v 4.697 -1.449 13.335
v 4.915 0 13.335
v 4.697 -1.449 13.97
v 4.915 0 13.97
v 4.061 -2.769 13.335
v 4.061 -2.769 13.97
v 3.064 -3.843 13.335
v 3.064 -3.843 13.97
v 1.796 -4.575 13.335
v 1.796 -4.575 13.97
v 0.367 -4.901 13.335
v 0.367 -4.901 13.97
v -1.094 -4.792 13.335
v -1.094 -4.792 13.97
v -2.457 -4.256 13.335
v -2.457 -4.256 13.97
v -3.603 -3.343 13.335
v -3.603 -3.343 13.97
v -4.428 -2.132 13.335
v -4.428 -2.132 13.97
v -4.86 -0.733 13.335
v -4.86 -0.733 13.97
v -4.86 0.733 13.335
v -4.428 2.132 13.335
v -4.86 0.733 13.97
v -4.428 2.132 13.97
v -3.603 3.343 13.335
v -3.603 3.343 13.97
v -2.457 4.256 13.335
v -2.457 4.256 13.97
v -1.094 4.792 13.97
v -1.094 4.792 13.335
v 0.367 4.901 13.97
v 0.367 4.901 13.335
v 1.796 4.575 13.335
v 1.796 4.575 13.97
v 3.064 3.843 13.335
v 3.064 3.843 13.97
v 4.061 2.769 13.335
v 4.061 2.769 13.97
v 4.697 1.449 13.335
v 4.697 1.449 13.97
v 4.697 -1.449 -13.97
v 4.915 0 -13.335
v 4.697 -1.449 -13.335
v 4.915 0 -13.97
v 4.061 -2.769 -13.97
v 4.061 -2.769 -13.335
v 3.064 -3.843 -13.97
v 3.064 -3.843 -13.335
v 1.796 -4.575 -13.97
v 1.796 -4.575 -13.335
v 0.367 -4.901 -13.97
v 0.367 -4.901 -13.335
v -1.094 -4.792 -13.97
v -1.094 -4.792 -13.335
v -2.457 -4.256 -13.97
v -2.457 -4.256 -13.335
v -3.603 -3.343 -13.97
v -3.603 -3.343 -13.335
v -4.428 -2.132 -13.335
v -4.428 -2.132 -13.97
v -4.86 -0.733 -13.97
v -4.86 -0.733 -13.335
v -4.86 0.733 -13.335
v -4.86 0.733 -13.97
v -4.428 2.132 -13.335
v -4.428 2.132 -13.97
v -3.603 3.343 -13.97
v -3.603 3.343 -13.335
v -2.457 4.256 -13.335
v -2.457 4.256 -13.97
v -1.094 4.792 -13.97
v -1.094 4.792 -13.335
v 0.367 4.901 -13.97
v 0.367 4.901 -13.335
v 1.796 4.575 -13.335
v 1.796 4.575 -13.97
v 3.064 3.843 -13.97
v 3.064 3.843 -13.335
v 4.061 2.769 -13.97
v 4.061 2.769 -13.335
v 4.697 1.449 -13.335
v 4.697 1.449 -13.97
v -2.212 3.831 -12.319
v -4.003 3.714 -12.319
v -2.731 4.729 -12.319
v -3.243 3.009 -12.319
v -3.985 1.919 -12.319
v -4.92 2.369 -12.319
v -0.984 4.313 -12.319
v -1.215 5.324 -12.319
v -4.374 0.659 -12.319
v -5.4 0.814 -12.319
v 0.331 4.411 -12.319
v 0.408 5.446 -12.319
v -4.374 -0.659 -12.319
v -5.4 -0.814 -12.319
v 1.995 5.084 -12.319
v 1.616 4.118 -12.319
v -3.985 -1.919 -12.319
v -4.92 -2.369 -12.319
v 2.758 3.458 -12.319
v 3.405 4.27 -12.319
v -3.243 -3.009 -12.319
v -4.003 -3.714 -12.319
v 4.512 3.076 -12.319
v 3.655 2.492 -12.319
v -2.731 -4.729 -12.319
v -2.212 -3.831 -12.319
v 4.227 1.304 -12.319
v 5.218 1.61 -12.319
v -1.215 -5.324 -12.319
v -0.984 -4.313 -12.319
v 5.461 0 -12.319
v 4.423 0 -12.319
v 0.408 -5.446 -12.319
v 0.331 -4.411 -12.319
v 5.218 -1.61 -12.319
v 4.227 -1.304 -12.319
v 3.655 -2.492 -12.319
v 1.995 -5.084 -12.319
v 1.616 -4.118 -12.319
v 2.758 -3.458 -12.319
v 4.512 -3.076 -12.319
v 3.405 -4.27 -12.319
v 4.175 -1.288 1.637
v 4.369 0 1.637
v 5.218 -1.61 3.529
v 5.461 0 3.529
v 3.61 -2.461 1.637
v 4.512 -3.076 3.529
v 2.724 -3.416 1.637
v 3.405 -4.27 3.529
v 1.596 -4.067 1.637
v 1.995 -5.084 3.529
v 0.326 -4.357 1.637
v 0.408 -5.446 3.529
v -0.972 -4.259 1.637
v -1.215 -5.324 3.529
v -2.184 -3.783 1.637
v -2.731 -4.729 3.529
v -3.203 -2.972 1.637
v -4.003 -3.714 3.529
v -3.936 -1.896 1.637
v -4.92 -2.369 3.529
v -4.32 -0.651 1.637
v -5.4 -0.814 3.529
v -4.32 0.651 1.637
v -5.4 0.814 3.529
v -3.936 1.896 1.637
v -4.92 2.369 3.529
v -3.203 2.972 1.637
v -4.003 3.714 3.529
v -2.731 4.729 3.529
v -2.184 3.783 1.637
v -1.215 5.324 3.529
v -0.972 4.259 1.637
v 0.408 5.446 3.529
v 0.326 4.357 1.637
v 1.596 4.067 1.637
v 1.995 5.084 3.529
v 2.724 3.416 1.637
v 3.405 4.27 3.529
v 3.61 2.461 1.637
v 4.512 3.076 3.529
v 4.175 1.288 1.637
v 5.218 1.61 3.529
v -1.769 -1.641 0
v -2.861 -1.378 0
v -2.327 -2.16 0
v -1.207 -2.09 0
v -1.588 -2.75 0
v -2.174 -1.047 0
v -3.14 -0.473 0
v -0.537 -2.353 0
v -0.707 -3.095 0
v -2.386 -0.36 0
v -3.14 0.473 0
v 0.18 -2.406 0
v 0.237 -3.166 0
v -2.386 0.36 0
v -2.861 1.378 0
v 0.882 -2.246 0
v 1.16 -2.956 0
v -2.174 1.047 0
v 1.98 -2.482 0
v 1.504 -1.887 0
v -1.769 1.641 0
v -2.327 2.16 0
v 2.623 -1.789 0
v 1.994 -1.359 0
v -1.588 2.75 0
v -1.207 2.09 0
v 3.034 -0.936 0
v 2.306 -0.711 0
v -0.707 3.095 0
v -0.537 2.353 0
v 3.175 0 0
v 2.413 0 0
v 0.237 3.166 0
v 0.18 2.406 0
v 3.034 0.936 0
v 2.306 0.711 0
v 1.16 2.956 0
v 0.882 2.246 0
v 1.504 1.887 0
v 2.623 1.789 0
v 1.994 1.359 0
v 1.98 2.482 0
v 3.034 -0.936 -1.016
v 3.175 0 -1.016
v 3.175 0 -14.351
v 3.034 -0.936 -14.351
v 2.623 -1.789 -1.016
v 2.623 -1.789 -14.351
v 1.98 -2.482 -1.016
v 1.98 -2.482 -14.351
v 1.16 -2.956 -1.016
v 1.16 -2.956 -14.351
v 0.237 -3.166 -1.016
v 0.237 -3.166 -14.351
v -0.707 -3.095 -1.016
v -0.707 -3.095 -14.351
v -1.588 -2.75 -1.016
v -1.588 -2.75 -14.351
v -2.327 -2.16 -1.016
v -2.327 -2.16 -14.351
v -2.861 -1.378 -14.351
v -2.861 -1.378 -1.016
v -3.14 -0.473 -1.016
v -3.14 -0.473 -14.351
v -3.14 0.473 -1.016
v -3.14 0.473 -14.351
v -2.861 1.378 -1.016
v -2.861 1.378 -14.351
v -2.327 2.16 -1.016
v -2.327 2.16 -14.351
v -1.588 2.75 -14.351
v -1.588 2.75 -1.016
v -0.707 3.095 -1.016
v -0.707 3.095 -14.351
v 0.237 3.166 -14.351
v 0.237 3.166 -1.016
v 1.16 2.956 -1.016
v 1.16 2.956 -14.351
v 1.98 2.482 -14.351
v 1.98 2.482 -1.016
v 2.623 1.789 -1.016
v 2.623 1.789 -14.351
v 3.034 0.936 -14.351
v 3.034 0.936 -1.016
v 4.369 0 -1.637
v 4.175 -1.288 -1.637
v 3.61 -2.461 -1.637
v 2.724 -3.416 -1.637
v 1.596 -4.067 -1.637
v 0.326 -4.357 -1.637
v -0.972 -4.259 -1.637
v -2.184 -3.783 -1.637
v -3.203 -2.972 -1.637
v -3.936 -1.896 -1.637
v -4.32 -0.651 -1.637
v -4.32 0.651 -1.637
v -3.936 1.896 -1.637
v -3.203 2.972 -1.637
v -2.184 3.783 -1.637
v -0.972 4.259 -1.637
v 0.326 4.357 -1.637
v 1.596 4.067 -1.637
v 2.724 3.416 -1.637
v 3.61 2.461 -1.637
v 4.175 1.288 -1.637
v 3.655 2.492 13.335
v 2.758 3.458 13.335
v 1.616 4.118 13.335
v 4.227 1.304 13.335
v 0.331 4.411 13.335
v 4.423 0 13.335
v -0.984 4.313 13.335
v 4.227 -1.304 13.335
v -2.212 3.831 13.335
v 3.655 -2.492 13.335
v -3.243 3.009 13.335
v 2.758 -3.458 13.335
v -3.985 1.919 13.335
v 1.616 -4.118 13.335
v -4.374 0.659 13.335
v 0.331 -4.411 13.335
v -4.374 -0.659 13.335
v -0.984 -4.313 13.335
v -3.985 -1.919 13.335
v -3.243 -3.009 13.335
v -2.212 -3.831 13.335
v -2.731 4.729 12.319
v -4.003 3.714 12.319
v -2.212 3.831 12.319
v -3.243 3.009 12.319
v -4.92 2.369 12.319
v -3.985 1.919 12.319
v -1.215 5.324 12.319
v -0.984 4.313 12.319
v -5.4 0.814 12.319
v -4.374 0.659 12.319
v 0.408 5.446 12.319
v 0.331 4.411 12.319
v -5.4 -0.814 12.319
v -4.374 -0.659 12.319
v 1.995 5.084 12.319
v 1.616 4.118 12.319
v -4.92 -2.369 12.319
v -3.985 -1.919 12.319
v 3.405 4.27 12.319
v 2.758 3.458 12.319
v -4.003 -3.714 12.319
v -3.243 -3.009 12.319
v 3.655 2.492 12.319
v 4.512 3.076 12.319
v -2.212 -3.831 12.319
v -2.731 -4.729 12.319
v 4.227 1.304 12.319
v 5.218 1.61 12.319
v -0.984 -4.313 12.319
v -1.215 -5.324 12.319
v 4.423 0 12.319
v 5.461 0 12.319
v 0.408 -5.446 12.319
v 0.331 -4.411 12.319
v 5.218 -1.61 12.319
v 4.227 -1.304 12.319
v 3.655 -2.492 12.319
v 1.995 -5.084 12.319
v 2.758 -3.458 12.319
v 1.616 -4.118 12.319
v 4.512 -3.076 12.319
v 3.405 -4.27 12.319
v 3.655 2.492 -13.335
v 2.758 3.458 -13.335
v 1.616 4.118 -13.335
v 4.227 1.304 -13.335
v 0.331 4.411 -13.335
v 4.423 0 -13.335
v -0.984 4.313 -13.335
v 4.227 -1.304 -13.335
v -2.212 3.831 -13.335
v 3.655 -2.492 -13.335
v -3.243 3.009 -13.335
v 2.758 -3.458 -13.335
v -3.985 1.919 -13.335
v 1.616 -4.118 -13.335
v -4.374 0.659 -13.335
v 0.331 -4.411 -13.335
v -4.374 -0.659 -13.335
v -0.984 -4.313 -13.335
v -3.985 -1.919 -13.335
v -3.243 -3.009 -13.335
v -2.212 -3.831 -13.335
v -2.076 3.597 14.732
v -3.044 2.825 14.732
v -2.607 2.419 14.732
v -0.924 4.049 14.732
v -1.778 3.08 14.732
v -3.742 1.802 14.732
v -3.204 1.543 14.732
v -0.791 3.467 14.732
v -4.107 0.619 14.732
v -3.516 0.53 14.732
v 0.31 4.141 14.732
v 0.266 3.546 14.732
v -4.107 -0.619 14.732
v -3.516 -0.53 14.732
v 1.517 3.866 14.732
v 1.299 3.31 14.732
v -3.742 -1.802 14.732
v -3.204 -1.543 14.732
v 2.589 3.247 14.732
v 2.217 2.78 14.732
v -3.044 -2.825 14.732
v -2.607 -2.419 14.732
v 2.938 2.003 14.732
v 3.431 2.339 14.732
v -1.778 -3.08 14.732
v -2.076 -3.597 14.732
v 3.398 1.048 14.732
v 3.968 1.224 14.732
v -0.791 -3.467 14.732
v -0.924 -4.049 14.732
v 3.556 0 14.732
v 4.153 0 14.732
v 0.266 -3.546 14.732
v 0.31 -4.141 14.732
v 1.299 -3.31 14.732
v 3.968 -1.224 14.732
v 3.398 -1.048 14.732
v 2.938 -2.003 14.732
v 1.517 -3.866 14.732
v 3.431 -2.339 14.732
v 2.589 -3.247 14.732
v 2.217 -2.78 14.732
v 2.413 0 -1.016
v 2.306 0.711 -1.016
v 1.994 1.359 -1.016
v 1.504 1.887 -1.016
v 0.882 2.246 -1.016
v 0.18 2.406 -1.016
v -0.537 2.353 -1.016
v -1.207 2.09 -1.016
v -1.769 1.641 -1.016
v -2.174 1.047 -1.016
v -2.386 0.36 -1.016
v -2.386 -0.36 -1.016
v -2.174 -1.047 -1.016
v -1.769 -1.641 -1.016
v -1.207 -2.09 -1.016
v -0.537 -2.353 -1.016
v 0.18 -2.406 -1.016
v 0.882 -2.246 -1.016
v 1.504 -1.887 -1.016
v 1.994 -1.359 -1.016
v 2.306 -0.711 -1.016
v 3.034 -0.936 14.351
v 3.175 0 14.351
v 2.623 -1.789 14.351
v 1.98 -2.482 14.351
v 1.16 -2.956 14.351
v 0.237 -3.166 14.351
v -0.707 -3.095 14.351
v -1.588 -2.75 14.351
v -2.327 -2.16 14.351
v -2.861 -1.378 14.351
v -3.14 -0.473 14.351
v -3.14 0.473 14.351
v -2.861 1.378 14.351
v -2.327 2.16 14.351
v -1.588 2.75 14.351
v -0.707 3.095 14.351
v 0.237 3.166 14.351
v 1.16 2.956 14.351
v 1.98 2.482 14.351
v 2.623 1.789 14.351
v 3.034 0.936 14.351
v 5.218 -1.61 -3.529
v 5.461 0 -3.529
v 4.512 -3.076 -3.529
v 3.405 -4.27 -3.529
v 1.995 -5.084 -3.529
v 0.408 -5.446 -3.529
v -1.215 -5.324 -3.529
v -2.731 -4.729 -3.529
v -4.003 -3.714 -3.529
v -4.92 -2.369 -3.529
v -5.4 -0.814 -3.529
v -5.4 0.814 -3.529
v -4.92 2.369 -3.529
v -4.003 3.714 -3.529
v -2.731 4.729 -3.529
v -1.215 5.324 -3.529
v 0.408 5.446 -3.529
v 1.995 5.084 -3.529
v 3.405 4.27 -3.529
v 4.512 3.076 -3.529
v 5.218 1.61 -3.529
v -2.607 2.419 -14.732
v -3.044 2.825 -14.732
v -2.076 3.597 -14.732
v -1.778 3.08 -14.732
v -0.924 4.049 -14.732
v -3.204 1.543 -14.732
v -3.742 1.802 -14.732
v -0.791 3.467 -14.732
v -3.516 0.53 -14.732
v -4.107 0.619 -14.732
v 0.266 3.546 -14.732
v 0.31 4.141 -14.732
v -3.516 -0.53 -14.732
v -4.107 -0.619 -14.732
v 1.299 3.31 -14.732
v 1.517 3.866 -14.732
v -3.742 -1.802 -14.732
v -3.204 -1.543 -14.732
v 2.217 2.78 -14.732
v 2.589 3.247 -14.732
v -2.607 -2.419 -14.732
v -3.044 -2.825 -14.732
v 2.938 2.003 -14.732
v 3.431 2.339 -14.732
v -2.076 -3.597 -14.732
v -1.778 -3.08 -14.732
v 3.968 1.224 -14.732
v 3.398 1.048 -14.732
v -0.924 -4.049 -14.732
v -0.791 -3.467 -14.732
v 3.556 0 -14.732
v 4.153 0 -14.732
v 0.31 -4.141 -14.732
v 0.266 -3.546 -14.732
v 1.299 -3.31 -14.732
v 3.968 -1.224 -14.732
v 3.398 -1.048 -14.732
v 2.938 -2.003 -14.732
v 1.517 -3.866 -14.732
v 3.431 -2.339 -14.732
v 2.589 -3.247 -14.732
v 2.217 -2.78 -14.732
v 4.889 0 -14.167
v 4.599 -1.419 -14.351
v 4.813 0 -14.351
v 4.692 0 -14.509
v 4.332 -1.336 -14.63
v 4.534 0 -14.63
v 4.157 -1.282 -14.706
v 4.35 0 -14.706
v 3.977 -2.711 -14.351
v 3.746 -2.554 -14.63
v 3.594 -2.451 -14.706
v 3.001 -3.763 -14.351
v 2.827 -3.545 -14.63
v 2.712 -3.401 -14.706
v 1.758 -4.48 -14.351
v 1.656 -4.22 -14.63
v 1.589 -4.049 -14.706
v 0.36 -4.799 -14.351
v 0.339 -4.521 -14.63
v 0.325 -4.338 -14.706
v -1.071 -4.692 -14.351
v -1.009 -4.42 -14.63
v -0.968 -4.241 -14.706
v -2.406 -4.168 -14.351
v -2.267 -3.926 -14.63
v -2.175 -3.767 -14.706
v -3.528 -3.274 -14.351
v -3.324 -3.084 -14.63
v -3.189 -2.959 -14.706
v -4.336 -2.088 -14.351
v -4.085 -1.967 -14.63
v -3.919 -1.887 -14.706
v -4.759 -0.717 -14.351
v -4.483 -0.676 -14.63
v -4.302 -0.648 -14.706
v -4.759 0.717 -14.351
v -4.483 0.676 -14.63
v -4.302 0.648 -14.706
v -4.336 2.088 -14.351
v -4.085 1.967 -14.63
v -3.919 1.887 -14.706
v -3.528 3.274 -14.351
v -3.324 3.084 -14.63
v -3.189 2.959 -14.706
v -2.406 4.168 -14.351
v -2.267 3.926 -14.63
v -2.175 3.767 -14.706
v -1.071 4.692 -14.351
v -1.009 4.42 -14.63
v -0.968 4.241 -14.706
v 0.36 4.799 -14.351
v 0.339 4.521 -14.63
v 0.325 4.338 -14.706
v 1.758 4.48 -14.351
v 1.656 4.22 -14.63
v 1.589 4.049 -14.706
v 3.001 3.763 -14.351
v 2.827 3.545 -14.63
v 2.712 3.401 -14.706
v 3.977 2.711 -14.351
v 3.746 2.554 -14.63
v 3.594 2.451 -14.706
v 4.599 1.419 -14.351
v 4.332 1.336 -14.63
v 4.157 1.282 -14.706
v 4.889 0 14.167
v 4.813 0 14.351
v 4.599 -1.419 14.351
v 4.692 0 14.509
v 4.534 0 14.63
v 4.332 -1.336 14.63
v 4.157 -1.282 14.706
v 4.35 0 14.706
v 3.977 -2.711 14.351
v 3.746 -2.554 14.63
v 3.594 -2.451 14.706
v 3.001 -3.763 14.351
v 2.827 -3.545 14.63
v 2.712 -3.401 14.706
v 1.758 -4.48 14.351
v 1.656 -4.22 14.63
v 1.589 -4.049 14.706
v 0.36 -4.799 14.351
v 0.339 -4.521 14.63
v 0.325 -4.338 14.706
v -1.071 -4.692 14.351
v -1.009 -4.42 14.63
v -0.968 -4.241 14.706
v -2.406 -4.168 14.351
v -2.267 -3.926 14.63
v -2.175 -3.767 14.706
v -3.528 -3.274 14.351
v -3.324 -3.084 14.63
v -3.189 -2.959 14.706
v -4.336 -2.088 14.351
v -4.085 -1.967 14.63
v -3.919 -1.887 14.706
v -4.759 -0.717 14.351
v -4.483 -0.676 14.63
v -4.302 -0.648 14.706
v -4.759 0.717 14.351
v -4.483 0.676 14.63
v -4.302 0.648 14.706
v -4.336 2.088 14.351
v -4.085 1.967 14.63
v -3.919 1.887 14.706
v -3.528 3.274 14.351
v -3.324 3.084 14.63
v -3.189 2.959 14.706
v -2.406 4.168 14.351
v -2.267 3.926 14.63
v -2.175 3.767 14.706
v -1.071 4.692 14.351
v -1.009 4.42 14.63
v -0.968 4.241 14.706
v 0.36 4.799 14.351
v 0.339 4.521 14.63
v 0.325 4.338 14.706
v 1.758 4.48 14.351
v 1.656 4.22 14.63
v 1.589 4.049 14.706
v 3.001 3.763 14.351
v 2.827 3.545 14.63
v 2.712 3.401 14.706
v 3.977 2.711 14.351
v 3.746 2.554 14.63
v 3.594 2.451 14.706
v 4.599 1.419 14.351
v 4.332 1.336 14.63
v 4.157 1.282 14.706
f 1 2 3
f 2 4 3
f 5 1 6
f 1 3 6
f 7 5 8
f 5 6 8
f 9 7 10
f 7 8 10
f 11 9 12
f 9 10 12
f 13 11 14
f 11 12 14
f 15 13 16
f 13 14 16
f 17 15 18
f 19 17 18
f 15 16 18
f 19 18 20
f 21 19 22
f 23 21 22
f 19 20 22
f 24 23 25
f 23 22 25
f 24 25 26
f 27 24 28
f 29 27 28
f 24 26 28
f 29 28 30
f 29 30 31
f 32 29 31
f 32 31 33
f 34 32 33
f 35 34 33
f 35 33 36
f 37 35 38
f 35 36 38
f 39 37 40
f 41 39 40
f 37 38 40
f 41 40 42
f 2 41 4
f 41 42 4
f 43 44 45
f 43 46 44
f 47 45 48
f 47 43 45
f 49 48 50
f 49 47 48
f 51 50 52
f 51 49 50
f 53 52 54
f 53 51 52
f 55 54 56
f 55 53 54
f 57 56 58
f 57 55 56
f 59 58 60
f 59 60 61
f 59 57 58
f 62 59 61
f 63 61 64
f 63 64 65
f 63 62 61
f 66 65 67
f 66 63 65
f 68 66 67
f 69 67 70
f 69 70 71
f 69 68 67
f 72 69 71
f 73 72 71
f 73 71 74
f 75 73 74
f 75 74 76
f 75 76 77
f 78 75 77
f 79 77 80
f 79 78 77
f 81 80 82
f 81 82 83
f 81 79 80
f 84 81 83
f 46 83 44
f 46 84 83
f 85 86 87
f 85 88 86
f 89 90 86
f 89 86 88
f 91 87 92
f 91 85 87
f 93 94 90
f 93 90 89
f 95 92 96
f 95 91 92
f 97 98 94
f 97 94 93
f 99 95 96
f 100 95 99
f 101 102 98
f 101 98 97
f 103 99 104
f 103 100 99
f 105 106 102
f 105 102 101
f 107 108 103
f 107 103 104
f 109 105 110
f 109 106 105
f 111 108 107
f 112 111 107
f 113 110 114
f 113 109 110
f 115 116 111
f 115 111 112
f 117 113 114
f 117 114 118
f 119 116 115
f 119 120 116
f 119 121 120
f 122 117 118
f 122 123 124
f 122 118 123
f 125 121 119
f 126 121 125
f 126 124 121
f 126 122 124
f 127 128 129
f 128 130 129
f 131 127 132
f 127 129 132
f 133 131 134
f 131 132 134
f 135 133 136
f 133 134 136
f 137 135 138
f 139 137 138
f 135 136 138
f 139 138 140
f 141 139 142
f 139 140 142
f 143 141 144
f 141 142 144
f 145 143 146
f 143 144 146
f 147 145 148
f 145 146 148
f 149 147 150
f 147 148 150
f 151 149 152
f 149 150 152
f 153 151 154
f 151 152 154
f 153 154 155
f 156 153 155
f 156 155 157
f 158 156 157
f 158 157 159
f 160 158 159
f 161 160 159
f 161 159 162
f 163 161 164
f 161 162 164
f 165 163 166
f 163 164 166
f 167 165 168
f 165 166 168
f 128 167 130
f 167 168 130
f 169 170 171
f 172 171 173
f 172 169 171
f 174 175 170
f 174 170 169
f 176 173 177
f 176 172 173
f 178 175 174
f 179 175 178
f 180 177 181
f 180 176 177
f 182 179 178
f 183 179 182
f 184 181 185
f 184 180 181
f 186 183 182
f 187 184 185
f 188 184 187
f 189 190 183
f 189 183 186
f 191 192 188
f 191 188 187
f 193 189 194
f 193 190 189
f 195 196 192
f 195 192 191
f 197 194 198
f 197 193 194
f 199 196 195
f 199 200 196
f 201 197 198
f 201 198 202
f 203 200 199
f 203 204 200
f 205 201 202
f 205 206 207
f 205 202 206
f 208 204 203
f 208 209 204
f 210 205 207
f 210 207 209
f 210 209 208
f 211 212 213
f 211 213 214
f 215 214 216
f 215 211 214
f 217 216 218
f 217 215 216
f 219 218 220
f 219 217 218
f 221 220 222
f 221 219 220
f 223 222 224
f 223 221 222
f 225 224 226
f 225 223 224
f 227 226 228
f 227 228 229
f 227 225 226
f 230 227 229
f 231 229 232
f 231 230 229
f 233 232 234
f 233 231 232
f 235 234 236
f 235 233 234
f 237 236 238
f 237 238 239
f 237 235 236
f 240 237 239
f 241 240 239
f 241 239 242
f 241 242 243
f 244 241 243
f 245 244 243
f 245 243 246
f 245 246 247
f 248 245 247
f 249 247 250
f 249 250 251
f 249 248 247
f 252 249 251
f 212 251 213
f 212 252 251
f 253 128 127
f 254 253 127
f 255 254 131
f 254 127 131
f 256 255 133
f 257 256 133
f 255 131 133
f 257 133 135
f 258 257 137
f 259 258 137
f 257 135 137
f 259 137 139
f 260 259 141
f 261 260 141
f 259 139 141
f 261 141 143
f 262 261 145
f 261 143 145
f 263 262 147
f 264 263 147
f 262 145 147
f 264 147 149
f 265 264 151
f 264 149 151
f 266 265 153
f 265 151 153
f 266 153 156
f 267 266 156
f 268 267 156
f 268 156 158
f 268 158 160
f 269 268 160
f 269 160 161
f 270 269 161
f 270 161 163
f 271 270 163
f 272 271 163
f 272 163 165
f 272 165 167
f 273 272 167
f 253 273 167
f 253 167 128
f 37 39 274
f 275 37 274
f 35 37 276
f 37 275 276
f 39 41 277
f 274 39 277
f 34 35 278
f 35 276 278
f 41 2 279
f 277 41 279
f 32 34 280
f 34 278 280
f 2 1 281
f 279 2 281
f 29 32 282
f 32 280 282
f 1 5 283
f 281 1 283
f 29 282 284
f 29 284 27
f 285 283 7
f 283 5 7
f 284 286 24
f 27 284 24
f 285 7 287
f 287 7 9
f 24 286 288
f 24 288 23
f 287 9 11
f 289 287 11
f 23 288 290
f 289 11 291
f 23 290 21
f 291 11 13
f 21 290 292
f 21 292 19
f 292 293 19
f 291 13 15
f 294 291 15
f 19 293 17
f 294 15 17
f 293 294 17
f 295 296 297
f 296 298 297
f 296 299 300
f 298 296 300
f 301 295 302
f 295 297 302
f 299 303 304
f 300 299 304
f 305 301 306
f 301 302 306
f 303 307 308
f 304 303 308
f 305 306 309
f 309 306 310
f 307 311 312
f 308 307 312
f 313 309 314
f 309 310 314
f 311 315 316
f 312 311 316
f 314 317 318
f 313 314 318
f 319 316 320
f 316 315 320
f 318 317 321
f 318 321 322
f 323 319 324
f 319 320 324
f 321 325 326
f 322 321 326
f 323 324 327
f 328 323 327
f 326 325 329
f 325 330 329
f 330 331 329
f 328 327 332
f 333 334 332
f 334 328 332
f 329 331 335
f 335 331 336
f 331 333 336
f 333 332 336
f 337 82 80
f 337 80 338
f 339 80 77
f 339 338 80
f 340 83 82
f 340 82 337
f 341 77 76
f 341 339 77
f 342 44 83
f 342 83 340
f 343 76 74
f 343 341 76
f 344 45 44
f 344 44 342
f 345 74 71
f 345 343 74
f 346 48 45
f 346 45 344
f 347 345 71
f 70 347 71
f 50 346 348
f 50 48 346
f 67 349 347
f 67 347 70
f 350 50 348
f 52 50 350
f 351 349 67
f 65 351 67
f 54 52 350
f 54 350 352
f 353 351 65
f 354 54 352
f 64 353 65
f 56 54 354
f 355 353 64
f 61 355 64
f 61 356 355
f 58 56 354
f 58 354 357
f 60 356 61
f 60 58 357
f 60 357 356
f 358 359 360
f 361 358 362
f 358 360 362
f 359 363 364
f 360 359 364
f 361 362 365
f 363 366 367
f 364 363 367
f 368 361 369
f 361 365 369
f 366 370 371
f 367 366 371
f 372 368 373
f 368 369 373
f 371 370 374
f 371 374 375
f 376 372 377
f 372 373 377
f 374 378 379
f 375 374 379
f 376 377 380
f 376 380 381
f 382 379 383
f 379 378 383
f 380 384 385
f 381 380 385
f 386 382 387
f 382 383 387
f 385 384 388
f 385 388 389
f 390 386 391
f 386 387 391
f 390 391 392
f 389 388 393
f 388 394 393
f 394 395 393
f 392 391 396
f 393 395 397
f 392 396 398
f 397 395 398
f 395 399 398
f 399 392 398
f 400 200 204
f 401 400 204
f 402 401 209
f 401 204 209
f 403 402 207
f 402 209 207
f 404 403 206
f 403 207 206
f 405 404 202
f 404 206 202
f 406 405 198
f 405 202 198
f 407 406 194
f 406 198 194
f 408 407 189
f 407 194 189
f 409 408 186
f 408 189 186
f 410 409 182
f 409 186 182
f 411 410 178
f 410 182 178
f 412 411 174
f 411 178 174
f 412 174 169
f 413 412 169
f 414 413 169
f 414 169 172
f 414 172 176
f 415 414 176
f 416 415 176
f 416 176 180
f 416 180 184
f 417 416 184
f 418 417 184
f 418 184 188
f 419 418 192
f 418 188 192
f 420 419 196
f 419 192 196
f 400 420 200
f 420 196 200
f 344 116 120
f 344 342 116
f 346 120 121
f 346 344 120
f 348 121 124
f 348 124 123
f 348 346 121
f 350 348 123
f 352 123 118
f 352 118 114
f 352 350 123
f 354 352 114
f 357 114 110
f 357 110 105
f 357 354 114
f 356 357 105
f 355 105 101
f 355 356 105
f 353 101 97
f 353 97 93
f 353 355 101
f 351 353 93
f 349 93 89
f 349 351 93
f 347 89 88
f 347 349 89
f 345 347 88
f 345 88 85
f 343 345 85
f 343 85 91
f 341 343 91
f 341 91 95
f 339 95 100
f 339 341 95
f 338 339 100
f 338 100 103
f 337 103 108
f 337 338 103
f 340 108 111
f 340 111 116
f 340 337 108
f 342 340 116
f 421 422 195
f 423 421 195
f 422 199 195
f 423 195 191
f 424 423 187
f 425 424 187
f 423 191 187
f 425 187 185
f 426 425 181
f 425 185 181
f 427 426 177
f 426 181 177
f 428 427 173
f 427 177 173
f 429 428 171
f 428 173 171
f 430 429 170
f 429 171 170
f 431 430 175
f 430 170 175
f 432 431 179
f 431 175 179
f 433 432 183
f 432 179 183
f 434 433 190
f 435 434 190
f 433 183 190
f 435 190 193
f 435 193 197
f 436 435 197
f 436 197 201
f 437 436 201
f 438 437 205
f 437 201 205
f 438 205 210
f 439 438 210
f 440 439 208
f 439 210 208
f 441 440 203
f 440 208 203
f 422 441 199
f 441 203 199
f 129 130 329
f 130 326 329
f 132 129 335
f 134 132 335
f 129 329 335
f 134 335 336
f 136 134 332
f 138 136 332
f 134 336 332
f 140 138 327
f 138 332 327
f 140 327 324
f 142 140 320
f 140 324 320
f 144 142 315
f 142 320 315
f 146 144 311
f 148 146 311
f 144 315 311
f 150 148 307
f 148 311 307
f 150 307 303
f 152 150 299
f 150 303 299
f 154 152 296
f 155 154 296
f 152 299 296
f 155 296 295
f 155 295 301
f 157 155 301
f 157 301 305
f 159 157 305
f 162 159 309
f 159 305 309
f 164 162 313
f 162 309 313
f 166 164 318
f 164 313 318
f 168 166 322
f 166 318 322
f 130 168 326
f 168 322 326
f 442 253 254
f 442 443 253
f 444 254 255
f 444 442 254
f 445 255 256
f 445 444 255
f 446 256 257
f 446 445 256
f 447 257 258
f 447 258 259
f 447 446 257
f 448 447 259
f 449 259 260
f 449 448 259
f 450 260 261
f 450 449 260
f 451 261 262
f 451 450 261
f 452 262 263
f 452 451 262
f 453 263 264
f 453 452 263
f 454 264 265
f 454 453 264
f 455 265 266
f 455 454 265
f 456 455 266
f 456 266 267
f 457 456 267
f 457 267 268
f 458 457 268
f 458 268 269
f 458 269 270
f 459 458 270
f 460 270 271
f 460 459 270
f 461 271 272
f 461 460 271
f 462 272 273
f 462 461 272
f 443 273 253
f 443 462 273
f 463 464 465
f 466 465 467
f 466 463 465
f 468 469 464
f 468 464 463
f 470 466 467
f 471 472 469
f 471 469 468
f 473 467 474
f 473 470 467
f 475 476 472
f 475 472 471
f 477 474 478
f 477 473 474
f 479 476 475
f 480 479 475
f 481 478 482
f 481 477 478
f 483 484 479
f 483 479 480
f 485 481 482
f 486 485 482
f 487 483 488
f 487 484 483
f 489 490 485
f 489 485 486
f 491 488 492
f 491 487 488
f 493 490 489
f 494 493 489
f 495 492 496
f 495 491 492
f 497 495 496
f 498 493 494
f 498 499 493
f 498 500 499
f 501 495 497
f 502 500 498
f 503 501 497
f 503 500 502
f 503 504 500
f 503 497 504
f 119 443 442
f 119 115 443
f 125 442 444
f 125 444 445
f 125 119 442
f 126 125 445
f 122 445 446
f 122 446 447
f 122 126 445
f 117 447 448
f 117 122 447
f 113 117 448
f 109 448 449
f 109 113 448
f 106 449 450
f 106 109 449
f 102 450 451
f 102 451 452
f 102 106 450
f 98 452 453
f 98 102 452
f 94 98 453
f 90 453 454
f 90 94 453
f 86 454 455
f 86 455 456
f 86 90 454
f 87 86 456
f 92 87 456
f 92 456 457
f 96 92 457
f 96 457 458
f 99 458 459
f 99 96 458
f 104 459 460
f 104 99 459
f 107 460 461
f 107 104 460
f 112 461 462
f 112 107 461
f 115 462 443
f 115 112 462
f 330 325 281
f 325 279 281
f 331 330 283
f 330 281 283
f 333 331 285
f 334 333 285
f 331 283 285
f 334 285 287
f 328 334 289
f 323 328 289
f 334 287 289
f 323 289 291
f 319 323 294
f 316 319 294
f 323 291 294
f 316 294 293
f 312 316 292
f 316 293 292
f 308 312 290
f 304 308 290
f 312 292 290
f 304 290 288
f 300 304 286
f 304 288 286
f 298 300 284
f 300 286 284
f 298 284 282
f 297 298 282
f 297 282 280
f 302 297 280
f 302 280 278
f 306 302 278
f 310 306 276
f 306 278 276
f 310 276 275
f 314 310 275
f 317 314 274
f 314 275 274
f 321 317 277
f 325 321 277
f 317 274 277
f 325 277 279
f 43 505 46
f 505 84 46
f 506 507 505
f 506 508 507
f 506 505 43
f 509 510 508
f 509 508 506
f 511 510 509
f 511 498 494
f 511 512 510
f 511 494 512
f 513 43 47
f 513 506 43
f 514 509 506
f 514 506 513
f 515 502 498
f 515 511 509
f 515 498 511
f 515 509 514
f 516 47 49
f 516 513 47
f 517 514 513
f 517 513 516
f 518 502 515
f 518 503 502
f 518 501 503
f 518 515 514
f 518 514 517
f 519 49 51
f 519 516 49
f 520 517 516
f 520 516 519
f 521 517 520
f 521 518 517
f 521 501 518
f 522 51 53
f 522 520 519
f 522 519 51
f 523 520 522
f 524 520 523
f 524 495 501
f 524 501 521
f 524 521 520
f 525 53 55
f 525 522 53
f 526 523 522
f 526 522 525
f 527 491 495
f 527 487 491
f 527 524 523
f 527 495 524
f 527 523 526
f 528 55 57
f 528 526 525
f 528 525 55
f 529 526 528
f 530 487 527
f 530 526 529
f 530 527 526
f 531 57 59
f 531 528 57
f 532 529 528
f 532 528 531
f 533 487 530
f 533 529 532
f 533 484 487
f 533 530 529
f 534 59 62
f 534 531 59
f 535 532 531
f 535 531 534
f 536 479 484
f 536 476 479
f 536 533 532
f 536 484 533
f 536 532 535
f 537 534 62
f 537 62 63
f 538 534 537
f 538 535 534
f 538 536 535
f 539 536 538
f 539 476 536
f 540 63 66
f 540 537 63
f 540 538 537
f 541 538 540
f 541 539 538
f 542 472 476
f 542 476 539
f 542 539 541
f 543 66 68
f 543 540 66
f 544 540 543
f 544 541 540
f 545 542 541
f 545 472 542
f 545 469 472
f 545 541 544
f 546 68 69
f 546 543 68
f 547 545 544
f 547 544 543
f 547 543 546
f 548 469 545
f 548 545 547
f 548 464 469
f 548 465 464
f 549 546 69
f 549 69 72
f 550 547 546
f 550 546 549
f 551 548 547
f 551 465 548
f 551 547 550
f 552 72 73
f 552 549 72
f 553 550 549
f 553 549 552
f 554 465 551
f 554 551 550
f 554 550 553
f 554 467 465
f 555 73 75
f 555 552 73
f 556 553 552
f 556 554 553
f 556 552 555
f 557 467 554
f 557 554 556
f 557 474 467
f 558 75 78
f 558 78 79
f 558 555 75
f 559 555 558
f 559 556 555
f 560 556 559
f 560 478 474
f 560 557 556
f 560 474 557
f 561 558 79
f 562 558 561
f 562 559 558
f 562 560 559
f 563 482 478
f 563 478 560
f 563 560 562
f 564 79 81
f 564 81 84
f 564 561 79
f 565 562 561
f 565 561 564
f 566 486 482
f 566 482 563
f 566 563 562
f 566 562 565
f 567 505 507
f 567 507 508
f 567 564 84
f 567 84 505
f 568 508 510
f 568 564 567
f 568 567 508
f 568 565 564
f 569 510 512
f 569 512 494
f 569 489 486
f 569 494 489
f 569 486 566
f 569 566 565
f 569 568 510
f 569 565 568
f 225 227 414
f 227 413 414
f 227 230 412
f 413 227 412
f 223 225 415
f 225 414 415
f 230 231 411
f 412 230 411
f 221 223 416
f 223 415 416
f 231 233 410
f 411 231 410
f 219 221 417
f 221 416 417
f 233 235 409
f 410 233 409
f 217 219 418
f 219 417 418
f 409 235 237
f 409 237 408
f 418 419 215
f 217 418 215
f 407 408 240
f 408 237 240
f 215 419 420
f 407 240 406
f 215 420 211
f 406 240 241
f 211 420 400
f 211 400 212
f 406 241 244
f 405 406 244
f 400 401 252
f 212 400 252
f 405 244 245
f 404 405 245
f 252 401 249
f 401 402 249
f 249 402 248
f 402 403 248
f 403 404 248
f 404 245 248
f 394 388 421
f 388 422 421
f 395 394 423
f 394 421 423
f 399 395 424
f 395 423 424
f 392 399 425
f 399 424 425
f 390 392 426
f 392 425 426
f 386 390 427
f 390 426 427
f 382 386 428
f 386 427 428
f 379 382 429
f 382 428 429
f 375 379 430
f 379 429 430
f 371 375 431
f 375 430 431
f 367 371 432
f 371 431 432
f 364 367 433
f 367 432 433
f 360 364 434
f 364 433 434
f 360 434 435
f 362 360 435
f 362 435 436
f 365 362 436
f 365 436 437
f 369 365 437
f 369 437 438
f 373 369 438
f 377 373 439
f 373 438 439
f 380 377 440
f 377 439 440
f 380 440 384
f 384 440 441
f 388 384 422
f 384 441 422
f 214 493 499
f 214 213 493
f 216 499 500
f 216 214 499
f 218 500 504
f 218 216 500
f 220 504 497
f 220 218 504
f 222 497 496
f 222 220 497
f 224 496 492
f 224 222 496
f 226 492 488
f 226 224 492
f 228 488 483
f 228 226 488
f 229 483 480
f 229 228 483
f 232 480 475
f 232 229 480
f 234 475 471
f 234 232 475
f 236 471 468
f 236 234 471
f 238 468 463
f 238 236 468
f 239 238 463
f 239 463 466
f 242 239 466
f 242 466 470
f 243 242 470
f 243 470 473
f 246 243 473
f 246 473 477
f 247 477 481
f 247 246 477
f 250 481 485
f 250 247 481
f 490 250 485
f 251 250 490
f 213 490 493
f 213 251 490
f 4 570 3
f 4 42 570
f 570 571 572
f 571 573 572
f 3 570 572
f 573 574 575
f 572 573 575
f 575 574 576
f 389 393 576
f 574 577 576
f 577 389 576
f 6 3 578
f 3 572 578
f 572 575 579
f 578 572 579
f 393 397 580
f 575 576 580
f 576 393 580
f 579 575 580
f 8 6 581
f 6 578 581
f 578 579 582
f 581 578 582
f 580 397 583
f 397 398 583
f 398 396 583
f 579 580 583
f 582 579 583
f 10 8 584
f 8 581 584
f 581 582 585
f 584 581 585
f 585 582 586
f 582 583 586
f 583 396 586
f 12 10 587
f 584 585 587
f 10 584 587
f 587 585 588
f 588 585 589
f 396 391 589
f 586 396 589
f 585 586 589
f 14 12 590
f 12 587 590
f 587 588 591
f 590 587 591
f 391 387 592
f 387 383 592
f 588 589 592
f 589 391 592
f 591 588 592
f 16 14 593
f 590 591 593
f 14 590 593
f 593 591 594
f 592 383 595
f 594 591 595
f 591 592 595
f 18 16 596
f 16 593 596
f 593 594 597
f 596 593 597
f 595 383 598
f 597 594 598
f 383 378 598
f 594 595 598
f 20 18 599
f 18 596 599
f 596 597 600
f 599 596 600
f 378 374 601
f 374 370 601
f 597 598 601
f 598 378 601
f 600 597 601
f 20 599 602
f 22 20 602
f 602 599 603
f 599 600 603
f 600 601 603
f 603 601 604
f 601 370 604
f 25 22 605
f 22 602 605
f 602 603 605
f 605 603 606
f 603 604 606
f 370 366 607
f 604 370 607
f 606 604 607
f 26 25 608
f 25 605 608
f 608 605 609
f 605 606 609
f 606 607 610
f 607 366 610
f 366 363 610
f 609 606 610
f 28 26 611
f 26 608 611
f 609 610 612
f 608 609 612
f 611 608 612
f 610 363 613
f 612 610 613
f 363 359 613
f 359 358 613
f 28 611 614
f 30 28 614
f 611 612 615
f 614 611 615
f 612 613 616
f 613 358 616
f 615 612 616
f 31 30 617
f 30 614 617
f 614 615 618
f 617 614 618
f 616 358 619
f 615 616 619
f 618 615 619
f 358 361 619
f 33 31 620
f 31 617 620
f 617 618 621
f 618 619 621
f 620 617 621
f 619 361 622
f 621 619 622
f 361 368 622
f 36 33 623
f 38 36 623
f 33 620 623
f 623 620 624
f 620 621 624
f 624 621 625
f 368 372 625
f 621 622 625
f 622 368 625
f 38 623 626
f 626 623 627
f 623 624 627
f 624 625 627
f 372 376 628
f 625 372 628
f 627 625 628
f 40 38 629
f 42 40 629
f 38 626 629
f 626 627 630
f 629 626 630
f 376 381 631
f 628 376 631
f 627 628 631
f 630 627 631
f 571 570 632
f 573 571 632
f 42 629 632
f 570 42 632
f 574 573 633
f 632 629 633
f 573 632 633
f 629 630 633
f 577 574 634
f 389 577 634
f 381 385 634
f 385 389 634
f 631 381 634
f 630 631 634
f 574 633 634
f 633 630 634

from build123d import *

# Parameters (mm, degrees)
SKETCH9_R      = 3.175
SKETCH9_R_2    = 2.413
EXTRUDE1_DEPTH = 1.016


with BuildPart() as part:
    # Sketch8 → Revolve1 (revolve)
    with BuildSketch(Plane(origin=(0, 0, 0), x_dir=(0, 0, -1), z_dir=(1, 0, 0)), mode=Mode.PRIVATE) as revolve1_sk:
        with BuildLine():
            Line((13.335, 4.9149), (13.97, 4.9149))
            ThreePointArc((13.97, 4.9149), (14.508815367, 4.691715367), (14.732, 4.1529))
            Line((14.732, 4.1529), (14.732, 3.556))
            Line((14.732, 3.556), (14.351, 3.175))
            Line((14.351, 3.175), (0, 3.175))
            Line((0, 3.175), (0, 4.3688))
            Line((0, 4.3688), (1.636888889, 4.3688))
            Line((1.636888889, 4.3688), (3.528634781, 5.461))
            Line((3.528634781, 5.461), (12.319, 5.461))
            Line((12.319, 5.461), (12.319, 4.42341))
            Line((12.319, 4.42341), (13.335, 4.42341))
            Line((13.335, 4.42341), (13.335, 4.9149))
        make_face()
    revolve1 = revolve(revolve1_sk.sketch.rotate(Axis((0, 0, 0), (0, 0, -1)), 90), axis=Axis((0, 0, 0), (0, 0, -1)))  # turned: the seam where the file's is

    # Sketch9 → Extrude1 (add)
    with BuildSketch(Plane.XY):
        Circle(SKETCH9_R)
        Circle(SKETCH9_R_2, mode=Mode.SUBTRACT)
    extrude(amount=-EXTRUDE1_DEPTH)

    # Mirror1: Revolve1 across plane
    add(revolve1.mirror(Plane.XY))


solid = part.part
